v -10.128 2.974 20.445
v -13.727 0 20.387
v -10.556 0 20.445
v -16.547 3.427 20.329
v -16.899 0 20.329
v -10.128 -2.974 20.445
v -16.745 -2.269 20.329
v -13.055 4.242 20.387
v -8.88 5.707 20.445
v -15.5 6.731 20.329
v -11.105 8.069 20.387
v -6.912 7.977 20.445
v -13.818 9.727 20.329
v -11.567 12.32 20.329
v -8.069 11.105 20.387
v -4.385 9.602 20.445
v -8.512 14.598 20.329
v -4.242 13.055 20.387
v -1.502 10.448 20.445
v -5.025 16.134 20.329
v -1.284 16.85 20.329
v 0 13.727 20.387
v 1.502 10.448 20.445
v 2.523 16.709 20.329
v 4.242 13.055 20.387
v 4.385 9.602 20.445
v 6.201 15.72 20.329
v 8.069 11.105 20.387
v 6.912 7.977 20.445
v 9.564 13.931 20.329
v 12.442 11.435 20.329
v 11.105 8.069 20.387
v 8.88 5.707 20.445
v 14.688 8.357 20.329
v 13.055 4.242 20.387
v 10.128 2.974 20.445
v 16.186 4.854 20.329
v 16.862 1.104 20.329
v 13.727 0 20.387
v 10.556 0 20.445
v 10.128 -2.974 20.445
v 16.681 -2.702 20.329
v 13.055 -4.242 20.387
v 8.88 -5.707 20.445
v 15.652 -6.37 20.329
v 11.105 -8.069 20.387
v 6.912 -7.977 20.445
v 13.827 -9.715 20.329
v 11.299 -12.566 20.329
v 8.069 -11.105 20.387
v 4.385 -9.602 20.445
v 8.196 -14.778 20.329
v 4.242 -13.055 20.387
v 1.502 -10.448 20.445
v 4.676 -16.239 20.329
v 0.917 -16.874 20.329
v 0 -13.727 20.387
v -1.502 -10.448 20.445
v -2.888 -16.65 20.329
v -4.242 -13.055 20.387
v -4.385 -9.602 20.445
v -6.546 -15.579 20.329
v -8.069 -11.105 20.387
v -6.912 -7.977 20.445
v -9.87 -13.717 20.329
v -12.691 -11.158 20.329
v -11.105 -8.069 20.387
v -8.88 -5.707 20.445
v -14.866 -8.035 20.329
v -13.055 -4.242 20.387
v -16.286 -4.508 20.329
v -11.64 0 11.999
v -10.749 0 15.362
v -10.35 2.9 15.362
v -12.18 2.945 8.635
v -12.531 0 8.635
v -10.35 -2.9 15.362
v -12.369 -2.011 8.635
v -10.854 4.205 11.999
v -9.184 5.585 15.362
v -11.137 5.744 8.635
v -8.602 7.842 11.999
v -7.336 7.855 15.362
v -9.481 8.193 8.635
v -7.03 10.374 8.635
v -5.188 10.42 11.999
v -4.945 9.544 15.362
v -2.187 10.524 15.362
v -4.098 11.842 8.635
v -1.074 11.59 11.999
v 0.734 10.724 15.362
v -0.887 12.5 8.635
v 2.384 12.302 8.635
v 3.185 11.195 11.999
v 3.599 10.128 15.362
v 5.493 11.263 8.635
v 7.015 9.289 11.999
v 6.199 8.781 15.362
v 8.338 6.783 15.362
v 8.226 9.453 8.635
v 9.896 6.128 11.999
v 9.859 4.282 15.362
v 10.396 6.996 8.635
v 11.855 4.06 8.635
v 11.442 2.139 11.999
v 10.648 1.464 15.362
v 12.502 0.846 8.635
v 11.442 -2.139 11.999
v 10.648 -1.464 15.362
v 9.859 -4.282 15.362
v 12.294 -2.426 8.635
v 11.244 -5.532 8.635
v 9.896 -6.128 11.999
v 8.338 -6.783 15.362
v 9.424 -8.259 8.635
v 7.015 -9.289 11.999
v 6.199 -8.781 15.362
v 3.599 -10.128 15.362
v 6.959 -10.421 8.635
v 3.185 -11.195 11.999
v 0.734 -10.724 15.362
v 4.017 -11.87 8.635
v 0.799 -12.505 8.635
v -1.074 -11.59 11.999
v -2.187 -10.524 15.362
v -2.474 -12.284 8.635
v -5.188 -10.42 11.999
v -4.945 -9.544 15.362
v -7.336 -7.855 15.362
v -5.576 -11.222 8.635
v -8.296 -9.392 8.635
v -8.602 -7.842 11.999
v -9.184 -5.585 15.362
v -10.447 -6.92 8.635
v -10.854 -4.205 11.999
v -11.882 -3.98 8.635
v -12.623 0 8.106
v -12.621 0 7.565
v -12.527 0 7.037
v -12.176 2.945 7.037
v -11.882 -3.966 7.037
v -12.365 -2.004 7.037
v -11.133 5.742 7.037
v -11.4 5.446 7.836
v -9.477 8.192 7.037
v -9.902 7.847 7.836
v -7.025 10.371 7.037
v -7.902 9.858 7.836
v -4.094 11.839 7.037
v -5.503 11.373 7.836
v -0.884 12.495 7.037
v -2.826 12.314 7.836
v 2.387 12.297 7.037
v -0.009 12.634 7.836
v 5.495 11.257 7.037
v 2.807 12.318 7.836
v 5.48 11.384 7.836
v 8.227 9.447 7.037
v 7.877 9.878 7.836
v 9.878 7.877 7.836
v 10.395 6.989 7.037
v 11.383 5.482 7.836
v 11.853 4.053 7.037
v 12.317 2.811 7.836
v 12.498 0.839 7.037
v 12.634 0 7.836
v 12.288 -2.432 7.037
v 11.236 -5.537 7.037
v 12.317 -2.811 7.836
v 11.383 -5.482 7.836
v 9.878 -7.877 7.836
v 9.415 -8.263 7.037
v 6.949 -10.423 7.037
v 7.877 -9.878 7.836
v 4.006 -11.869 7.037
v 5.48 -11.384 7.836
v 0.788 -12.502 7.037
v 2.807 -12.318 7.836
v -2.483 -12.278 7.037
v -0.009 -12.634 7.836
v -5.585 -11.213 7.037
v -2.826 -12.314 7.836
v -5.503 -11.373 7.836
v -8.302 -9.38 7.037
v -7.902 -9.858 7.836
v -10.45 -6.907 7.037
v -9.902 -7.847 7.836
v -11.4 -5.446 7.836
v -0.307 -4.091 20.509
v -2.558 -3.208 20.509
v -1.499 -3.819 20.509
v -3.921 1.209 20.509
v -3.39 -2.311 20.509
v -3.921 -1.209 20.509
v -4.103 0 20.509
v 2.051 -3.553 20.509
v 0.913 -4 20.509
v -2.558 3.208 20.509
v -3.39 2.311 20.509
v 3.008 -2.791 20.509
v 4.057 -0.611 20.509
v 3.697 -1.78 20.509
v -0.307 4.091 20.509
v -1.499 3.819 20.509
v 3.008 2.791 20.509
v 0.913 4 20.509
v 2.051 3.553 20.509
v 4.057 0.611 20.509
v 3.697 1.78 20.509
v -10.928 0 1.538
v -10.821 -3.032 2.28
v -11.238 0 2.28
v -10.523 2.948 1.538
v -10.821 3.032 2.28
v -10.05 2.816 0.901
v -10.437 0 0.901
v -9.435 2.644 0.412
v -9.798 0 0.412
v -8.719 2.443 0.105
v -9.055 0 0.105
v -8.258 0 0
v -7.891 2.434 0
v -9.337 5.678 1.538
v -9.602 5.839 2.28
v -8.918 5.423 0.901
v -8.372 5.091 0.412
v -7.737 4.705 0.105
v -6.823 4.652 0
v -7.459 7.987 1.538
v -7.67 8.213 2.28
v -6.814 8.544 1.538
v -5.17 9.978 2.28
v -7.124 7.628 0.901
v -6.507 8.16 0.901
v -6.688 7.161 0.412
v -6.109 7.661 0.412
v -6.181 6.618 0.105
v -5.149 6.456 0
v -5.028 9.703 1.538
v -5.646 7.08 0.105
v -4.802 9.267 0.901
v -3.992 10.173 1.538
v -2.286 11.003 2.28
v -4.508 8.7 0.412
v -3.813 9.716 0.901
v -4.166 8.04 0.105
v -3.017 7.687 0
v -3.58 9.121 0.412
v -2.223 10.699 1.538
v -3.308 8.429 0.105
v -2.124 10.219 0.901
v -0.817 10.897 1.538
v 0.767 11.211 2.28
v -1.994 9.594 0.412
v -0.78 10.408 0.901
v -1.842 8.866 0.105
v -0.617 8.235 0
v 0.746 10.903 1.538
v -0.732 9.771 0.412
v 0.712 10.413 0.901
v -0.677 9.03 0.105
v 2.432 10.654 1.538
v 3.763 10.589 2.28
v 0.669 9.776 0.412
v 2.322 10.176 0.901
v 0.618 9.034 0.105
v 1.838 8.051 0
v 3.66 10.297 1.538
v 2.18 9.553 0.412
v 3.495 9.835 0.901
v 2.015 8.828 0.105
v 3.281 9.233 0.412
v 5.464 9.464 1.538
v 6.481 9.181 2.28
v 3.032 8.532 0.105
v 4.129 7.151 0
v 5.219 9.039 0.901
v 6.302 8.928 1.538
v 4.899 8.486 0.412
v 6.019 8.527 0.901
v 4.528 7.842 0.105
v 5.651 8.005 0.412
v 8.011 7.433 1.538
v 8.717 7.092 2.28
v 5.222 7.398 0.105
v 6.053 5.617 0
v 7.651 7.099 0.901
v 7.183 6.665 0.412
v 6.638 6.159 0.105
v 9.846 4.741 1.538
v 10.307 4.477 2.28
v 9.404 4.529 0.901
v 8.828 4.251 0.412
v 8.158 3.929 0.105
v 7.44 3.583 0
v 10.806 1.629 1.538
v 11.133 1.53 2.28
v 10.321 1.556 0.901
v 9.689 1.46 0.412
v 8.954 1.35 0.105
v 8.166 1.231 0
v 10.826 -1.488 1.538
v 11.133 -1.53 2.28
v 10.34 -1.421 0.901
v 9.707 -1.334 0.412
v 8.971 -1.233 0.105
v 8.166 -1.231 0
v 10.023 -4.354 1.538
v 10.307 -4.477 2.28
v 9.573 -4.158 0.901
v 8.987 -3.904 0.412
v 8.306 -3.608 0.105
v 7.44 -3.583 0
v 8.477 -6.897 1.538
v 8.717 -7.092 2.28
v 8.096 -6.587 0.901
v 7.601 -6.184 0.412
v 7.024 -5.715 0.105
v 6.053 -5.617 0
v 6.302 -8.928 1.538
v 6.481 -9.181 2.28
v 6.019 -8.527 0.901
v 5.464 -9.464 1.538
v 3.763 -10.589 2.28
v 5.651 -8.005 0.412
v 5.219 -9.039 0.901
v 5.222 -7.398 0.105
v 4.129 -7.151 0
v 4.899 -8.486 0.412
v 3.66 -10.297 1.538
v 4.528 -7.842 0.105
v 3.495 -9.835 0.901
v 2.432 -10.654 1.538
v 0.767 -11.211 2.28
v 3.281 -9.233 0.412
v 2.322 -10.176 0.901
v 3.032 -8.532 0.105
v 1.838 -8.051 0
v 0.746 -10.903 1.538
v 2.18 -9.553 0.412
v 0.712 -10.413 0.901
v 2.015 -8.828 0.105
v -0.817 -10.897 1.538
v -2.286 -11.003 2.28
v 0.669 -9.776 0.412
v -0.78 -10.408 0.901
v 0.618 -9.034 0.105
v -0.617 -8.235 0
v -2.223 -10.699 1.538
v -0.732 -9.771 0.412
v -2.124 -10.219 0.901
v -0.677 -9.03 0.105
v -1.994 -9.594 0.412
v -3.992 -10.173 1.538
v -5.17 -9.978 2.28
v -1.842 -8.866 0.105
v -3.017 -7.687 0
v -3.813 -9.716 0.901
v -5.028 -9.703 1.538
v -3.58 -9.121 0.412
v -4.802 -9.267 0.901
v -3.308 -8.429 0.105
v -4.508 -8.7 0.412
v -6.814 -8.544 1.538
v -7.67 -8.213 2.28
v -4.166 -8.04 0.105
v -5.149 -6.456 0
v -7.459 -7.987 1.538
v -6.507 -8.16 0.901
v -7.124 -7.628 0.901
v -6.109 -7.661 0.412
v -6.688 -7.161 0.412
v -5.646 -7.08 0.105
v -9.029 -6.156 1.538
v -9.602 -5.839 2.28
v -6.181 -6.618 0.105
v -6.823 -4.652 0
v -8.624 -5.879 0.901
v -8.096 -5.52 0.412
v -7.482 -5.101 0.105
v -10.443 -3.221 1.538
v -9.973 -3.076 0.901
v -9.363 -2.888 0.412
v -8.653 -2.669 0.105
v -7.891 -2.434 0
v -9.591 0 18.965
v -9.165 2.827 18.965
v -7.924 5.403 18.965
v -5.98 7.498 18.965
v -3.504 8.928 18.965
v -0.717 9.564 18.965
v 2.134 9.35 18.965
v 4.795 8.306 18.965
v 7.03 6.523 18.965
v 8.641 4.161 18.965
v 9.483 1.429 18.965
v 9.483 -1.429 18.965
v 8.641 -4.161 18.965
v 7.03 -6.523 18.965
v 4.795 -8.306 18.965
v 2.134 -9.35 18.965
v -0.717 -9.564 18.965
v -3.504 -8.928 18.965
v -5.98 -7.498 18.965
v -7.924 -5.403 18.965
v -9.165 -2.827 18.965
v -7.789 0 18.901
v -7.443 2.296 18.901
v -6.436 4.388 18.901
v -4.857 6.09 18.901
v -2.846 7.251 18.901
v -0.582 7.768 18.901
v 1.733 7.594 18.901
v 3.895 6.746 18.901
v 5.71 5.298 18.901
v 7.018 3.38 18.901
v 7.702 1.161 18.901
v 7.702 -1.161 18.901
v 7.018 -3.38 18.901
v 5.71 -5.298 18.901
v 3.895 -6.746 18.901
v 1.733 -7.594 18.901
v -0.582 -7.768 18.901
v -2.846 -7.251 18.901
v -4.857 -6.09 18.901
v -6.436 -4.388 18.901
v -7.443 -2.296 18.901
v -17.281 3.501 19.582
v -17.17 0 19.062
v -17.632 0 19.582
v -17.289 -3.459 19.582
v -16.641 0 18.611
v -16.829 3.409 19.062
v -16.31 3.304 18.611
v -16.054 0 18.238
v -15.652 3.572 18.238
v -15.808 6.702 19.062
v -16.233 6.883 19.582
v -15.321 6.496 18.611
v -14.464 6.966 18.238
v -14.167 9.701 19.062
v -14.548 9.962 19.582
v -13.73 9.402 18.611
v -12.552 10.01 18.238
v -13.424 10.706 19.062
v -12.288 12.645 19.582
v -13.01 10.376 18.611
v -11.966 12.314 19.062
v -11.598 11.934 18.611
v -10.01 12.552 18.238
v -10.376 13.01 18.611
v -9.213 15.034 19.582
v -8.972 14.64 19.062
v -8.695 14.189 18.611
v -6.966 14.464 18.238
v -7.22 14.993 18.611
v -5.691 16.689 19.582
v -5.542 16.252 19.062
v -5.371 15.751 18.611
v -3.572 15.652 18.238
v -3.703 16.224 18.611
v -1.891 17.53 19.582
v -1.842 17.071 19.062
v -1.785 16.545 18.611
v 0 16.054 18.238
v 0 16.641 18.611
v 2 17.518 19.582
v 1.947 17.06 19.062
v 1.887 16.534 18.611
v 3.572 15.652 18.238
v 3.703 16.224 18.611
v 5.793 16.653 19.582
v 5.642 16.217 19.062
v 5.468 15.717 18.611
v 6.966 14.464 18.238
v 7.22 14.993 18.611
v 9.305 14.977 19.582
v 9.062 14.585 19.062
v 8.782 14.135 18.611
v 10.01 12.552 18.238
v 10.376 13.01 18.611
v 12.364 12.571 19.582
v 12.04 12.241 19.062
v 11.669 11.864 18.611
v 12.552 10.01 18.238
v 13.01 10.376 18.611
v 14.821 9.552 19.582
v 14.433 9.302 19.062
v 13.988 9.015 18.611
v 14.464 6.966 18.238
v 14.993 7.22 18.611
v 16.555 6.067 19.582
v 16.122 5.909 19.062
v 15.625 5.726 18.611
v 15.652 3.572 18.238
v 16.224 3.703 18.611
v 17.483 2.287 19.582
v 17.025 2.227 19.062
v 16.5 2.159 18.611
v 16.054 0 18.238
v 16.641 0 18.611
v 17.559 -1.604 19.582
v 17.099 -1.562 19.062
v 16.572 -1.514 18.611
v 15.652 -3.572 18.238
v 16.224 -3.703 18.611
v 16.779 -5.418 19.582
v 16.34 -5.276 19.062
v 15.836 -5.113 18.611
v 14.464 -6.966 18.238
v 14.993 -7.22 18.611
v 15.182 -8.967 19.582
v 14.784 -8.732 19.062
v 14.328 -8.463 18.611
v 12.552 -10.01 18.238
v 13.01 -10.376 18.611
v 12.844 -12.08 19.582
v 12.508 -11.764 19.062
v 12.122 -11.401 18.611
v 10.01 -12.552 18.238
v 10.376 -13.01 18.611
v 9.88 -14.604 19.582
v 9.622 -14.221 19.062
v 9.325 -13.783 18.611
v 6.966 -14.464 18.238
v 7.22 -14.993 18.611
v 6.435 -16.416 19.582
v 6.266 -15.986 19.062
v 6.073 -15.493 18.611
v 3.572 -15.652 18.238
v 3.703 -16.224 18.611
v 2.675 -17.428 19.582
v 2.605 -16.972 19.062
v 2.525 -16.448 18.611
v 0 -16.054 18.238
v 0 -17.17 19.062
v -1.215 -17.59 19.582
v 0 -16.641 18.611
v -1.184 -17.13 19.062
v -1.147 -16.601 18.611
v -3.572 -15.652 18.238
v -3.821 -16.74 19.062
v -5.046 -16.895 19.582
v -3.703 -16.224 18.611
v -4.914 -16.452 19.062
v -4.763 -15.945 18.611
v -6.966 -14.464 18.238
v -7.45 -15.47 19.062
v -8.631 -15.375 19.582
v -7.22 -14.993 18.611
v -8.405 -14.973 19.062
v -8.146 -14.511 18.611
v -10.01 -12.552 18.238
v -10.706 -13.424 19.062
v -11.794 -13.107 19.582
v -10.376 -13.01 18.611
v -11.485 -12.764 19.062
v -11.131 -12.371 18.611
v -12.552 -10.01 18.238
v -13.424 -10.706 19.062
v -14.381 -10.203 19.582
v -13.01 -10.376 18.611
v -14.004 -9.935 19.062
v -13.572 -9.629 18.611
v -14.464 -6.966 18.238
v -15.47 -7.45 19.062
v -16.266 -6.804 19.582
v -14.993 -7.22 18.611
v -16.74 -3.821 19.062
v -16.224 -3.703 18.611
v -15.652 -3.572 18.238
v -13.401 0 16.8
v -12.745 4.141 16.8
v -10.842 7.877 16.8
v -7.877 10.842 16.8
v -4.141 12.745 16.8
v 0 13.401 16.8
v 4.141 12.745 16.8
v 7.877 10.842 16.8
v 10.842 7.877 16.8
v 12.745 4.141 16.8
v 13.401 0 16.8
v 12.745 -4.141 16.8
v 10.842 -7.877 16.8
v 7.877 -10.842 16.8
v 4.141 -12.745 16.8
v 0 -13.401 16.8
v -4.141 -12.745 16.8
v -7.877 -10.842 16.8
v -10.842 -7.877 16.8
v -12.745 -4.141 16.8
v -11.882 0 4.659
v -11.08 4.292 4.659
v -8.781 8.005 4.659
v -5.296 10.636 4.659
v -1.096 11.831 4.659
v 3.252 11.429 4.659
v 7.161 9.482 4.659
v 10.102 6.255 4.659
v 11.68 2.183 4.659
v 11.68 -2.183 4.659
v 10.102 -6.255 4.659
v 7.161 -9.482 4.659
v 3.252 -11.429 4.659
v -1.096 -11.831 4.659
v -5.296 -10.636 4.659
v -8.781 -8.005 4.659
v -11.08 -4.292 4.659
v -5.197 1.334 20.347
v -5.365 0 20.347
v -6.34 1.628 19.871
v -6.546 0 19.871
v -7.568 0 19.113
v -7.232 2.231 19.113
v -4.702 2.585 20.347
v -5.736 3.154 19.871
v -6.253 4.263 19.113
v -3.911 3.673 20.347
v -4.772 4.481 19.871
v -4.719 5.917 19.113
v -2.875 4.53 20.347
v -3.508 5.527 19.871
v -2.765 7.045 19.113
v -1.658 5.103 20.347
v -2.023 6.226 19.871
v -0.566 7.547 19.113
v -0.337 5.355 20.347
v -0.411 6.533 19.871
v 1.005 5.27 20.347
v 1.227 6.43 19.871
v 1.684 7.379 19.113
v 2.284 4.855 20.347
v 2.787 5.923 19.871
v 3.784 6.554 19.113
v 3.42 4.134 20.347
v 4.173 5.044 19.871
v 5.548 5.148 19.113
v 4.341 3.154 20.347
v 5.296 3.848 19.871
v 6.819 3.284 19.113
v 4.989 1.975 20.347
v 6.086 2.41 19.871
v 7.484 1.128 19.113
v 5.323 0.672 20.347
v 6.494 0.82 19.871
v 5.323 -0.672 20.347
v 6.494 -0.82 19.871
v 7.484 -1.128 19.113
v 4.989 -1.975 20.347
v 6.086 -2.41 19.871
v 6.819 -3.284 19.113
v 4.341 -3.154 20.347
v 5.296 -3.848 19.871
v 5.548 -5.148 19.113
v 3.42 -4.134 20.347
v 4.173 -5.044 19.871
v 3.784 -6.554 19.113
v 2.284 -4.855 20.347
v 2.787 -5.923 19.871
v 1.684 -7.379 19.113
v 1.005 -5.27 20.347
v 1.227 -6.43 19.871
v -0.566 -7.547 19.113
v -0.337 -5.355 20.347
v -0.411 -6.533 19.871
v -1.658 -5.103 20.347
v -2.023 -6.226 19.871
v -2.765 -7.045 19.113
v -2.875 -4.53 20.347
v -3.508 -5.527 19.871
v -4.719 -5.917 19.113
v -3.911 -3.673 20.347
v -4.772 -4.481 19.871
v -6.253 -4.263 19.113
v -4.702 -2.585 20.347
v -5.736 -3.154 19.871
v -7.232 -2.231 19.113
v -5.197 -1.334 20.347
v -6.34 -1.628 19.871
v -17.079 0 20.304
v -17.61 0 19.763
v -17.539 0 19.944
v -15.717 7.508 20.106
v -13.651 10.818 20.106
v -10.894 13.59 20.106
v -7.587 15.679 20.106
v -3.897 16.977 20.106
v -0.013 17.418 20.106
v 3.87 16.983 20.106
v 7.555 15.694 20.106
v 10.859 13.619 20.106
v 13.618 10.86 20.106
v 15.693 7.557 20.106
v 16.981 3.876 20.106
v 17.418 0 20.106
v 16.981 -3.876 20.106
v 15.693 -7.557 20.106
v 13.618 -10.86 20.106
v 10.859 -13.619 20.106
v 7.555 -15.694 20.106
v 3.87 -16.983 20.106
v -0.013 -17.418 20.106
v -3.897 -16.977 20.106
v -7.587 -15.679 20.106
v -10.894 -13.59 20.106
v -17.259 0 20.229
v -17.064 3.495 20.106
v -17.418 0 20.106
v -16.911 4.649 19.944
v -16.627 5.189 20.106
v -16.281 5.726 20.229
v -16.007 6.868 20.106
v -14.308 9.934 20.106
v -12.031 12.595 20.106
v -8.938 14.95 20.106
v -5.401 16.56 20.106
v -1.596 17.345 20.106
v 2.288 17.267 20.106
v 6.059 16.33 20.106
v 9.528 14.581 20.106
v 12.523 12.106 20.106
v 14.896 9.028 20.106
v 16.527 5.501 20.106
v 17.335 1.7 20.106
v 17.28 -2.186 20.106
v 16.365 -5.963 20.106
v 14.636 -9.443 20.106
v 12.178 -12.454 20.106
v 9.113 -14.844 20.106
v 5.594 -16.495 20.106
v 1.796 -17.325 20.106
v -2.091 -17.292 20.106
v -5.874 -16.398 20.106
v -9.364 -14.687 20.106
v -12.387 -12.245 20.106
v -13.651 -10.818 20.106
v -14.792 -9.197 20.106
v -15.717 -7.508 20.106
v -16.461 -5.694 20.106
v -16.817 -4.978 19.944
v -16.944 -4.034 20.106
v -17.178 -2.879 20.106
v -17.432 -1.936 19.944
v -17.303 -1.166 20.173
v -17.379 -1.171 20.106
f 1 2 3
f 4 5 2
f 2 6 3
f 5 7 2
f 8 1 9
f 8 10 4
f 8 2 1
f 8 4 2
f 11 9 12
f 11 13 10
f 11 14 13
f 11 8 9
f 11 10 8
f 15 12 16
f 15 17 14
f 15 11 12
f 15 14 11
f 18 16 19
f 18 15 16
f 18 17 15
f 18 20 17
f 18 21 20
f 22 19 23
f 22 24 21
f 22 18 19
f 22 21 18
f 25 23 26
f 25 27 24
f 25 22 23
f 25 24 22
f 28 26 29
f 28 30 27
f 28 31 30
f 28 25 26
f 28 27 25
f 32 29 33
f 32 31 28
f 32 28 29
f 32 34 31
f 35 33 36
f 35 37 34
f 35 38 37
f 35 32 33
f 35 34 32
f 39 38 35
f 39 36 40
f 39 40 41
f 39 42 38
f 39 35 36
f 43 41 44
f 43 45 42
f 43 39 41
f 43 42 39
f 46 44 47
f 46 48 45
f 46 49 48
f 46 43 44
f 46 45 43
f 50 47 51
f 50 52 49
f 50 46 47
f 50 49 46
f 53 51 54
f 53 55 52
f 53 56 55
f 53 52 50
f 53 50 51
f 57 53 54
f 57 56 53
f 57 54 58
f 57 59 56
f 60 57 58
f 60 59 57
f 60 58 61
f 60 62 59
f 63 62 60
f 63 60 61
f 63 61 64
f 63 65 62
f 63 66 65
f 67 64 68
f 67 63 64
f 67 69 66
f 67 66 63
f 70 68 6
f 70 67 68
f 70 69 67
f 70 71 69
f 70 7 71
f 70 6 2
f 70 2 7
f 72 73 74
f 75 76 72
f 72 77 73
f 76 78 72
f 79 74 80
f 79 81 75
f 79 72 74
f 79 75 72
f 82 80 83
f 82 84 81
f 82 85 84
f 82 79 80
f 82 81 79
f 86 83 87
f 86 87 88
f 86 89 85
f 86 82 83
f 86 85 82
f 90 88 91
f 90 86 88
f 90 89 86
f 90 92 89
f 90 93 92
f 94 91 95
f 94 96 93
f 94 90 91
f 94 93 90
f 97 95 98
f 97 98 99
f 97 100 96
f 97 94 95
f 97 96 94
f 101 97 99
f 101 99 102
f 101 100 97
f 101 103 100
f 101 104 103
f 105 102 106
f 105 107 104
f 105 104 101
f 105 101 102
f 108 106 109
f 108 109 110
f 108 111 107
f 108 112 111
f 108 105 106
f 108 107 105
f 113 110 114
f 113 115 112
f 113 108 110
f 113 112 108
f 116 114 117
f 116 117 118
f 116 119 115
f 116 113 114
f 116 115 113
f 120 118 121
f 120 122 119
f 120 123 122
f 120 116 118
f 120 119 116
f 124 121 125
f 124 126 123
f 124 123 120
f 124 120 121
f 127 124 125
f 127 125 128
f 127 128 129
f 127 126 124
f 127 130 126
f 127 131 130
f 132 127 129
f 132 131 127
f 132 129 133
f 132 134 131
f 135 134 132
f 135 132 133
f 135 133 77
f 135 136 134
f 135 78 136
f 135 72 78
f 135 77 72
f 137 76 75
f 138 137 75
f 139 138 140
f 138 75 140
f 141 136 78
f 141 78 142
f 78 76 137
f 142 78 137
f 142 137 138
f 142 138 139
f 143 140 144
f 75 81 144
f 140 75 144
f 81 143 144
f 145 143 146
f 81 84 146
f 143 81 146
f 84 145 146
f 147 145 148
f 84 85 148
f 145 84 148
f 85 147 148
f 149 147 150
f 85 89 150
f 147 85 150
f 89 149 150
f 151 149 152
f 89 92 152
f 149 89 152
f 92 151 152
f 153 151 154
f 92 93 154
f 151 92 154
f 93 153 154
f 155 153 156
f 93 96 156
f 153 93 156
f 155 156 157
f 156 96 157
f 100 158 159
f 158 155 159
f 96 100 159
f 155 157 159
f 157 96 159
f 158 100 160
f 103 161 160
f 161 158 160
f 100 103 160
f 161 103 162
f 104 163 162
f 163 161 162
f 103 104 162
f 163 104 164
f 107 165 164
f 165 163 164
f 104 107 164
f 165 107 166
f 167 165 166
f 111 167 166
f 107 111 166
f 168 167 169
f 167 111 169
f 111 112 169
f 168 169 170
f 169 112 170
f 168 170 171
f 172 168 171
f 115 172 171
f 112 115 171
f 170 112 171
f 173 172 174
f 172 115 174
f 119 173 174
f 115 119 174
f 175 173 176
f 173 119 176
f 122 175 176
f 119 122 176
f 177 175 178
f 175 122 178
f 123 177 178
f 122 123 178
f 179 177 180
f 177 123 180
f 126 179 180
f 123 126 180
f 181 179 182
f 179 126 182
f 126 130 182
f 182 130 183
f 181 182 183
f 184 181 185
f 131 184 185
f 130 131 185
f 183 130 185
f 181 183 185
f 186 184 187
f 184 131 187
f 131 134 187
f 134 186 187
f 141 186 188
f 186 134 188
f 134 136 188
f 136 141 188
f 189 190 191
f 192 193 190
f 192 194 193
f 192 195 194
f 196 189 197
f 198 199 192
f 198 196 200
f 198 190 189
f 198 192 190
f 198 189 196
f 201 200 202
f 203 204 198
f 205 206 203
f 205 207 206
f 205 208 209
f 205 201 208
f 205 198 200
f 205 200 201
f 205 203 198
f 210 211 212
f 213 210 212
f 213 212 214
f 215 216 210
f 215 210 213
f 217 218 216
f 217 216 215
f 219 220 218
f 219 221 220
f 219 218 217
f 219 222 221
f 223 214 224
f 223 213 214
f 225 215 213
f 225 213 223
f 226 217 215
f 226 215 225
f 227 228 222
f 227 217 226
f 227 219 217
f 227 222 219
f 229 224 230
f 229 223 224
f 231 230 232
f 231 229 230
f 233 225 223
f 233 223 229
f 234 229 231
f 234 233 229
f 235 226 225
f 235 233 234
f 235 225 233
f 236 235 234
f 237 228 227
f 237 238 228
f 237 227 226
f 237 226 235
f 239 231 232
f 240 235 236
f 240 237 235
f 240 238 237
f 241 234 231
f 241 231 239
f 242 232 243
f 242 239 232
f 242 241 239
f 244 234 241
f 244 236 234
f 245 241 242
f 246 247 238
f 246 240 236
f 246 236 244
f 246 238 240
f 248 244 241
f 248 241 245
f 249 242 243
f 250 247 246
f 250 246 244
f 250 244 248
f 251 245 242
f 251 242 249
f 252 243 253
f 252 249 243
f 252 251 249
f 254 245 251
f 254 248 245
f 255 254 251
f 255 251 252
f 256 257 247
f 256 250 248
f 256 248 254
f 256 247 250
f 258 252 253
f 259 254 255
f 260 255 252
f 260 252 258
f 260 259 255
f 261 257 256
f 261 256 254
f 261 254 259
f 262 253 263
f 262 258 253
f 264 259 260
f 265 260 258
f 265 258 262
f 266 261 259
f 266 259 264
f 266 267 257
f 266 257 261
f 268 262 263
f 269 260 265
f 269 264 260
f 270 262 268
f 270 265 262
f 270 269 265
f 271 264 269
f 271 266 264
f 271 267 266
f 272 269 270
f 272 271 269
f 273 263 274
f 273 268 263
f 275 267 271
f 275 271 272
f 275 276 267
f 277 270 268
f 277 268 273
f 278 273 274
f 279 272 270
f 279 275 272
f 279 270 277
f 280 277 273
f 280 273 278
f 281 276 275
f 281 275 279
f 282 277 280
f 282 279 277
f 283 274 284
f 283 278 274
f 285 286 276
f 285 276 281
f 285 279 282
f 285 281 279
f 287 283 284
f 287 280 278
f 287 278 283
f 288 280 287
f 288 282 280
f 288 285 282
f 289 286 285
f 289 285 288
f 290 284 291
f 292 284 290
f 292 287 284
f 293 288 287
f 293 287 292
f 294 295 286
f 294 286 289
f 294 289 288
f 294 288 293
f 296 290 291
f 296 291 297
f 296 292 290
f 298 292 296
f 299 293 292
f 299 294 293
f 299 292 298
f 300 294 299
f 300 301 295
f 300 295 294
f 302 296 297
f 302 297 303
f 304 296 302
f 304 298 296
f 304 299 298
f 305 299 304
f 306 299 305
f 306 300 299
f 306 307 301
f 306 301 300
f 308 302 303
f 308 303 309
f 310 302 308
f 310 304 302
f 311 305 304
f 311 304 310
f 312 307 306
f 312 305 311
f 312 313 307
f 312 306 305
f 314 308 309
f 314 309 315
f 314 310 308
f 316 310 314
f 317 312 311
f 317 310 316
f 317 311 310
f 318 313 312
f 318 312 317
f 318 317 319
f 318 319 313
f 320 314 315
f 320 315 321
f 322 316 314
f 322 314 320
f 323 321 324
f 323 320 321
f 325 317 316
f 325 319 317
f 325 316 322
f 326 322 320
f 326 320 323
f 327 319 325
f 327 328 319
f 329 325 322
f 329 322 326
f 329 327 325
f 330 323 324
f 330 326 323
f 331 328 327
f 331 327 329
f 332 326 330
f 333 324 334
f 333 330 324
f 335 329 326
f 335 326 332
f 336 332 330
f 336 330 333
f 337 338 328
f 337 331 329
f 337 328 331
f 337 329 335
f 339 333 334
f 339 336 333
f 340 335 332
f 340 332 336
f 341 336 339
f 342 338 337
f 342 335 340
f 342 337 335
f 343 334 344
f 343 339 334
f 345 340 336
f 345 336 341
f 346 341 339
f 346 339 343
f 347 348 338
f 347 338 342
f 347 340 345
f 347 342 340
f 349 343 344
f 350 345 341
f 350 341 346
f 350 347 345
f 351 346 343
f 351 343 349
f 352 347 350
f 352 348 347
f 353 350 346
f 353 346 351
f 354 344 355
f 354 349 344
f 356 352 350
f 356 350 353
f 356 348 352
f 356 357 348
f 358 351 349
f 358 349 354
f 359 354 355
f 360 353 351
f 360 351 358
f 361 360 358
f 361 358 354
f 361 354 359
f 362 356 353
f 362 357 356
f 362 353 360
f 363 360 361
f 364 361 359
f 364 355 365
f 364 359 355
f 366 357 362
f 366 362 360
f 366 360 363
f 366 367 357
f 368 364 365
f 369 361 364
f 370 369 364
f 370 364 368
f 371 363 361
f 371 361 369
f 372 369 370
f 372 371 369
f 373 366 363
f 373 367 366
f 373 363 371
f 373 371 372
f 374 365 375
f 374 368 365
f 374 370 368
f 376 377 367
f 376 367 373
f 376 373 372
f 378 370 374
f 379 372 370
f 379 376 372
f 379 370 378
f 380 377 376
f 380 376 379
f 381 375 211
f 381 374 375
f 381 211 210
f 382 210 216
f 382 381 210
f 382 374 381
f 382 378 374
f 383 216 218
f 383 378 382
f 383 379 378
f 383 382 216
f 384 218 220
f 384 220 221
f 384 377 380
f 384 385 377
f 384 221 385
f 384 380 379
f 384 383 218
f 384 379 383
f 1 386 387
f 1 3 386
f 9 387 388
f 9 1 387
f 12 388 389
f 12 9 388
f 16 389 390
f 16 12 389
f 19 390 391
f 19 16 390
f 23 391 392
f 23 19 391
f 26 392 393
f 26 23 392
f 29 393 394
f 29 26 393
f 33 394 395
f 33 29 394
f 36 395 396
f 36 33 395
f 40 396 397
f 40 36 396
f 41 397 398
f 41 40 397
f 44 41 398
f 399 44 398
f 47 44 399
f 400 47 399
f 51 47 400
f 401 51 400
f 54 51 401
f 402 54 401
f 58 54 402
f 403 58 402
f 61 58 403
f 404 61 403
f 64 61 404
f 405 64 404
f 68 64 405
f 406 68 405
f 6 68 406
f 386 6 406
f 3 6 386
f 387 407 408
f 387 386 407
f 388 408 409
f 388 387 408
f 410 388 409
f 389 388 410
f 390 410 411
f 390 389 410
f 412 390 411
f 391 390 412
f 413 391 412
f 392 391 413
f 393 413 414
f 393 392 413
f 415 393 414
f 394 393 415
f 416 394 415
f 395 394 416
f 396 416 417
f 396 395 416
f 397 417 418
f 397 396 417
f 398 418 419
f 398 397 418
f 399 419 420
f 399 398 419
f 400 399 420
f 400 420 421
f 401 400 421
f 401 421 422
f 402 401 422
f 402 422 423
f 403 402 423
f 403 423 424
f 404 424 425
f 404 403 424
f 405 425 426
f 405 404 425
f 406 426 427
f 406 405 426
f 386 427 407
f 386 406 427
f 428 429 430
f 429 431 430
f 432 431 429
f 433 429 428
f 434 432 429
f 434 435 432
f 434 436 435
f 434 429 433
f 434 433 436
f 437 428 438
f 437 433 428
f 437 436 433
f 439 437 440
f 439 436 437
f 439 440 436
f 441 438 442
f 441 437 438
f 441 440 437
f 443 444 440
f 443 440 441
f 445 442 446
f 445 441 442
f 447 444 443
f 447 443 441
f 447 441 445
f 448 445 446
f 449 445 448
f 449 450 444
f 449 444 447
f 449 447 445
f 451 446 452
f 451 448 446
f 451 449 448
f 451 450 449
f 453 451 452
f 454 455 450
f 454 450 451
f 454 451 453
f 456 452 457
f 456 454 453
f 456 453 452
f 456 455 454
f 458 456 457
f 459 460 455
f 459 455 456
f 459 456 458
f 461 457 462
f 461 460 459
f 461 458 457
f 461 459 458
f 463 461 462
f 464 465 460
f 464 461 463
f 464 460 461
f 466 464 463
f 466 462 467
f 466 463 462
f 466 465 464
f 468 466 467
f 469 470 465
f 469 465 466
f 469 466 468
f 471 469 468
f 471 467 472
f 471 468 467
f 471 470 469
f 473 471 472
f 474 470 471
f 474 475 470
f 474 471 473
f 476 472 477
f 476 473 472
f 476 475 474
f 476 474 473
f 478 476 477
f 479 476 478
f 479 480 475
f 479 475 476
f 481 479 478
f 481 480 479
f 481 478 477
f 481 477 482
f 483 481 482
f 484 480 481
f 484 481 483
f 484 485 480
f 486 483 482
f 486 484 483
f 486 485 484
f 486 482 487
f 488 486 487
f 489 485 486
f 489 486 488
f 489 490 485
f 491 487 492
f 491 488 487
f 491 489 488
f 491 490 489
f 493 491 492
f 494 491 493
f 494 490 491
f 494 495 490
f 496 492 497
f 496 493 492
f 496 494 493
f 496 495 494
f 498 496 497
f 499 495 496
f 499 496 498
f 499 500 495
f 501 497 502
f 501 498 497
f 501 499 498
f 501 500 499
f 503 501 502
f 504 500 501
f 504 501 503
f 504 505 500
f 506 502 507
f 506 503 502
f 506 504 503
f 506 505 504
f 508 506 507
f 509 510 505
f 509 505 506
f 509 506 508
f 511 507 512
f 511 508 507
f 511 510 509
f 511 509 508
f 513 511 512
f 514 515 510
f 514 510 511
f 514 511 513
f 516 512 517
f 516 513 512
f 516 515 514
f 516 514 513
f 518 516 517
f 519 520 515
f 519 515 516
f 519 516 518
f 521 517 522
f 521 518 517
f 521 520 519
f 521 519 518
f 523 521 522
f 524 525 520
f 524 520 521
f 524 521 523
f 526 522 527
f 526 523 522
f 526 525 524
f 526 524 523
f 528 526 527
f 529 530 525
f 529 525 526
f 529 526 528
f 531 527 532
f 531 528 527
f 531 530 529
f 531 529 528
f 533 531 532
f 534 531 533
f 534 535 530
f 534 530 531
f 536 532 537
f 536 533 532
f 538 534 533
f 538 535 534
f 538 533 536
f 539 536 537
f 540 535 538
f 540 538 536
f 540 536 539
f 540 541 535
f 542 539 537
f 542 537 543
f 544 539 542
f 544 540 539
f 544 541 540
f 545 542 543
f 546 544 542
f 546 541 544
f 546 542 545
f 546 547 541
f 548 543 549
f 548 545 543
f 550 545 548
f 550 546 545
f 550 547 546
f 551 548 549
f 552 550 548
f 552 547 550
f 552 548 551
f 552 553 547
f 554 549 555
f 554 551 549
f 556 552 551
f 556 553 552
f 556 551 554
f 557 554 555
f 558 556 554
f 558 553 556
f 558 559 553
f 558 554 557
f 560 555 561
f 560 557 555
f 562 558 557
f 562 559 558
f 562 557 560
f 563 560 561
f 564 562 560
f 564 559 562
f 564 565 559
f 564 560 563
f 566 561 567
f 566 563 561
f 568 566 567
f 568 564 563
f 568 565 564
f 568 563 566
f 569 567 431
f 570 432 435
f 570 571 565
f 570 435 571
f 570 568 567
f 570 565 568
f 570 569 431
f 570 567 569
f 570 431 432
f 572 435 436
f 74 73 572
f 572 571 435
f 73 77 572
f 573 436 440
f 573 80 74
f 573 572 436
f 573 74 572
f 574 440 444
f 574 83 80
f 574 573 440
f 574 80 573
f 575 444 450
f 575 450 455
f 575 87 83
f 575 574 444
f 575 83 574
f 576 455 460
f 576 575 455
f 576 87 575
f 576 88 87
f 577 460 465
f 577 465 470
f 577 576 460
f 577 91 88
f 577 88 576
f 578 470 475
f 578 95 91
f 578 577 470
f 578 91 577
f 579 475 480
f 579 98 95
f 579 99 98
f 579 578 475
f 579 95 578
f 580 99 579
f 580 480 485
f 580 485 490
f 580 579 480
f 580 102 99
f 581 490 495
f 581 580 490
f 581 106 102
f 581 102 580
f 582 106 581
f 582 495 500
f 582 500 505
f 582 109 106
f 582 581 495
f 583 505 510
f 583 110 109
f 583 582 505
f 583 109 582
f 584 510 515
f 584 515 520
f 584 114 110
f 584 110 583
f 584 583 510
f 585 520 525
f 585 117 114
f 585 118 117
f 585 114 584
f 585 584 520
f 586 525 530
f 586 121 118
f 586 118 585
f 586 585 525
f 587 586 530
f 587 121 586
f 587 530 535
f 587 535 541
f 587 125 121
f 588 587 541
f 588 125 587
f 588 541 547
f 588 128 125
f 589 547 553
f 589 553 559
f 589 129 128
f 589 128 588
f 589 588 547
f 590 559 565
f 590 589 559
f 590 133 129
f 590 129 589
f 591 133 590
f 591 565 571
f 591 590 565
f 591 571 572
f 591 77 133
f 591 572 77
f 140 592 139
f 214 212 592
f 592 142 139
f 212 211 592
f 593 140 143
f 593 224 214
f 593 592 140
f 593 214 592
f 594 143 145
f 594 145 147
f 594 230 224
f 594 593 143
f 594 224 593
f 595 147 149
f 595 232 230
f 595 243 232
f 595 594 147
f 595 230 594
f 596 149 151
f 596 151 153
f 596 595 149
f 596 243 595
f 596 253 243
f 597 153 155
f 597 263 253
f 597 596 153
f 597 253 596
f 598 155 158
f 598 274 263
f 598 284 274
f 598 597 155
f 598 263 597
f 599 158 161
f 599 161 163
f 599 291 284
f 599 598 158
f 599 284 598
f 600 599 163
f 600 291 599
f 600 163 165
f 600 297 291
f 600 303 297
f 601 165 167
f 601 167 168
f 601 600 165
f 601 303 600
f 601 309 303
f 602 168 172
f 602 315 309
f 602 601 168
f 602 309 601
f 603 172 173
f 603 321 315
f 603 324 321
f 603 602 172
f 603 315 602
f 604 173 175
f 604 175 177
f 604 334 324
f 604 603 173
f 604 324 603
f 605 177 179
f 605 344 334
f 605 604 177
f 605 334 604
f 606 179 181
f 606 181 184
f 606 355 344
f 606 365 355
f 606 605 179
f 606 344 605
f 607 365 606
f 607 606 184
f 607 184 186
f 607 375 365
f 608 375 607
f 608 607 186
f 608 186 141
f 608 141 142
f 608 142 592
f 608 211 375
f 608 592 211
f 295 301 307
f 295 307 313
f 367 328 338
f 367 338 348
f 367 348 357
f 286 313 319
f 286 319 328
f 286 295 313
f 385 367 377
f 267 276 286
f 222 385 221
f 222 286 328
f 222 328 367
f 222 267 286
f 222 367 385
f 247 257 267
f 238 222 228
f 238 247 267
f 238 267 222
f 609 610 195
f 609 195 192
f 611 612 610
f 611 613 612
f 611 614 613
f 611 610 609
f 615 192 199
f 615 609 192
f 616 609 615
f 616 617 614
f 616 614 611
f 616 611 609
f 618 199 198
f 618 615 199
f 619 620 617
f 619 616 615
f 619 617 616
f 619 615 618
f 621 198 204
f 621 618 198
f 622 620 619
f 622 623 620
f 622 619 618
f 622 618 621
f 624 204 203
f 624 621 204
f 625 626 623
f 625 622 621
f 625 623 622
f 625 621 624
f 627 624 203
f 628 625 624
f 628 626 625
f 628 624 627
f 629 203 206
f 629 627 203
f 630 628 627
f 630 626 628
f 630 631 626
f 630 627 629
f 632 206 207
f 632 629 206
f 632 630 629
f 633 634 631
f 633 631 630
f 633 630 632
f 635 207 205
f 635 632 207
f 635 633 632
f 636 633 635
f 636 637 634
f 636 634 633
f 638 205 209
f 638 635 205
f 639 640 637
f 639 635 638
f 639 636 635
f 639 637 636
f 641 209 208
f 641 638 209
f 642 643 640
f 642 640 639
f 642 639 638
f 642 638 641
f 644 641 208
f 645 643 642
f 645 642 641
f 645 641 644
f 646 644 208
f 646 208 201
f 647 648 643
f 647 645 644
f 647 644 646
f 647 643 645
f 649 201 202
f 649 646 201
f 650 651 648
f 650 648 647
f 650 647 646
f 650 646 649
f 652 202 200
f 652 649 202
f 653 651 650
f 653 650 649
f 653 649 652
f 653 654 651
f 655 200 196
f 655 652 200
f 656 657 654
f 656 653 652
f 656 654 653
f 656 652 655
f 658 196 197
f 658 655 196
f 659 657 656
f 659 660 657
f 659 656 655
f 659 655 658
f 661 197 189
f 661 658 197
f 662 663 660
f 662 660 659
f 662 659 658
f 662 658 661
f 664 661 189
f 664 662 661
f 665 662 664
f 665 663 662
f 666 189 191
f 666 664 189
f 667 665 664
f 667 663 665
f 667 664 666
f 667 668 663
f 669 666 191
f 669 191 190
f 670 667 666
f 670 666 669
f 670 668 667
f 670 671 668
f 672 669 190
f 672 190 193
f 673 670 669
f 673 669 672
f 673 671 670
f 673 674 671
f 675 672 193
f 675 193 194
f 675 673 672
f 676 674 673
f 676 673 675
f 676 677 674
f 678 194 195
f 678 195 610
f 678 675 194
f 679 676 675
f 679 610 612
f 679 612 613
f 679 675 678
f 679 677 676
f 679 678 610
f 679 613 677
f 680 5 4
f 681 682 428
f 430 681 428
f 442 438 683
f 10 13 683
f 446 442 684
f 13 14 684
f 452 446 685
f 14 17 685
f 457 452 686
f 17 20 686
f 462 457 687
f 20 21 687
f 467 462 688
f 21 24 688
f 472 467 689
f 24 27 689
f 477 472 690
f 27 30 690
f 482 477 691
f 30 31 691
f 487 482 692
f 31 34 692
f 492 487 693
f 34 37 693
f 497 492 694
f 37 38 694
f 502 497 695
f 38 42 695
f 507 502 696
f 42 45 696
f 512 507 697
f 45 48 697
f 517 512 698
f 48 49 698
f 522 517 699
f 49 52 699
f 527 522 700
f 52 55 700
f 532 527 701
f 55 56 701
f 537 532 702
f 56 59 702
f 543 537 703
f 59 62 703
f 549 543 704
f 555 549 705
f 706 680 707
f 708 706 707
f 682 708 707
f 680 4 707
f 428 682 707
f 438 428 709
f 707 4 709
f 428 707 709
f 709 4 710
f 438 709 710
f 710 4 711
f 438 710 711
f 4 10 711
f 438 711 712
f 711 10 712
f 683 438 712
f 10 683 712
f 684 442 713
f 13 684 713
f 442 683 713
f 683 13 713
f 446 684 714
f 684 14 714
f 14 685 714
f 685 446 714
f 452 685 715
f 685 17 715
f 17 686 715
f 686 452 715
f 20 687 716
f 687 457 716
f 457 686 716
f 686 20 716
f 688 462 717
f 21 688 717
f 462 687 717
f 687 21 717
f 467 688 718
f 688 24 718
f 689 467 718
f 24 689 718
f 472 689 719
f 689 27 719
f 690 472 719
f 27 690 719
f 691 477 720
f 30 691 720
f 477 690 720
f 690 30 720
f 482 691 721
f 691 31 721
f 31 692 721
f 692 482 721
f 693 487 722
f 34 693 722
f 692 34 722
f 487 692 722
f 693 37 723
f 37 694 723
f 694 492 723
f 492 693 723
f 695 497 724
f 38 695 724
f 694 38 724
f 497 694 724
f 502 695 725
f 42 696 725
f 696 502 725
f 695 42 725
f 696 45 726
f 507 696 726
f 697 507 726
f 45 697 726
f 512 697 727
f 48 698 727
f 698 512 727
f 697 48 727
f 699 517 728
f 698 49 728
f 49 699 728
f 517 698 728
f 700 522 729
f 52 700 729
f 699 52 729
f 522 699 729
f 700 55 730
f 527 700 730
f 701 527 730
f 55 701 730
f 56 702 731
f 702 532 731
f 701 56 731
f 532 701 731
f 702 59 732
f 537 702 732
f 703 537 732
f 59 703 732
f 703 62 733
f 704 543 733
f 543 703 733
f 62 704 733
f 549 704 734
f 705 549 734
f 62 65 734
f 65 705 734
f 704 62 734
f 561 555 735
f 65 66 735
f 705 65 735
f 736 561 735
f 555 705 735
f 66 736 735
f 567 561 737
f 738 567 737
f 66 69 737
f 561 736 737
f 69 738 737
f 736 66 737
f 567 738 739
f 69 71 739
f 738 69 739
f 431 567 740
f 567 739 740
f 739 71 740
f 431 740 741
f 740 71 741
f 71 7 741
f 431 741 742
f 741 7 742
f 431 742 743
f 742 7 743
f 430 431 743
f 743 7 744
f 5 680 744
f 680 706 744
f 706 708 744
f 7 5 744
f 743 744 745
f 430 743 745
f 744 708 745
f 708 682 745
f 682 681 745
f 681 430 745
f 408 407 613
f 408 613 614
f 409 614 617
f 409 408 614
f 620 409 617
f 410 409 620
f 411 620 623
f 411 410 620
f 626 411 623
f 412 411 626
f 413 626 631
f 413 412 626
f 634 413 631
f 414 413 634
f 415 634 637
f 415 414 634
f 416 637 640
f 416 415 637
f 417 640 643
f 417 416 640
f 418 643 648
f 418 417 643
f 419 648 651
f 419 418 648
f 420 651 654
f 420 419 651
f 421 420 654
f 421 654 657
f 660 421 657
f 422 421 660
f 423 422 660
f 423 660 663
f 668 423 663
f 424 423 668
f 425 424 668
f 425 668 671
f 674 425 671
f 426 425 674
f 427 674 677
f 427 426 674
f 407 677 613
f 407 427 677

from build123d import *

# Parameters (mm, degrees)
F2_R = 5
F3_R = 0.7471384798
F5_R = 3.0872818621


# Not quite as in the source:
# - a fillet or chamfer that OpenCascade refuses, or shapes differently, is made with other operations: its cross-section is extruded or revolved along the edge and cut away or added


with BuildPart() as f1:
    # F0 (on Front) → F1 (revolve)
    with BuildSketch(Plane.XZ):
        Polygon((-10.6199271977, 0), (0, 0), (0, 20.5089394003), (-6.1166980304, 20.5089394003), (-7.7893259004, 18.9006421715), (-9.590617381, 18.9649742097), (-10.5555951595, 20.4446054995), (-17.6320988685, 20.3159432858), (-17.6320988685, 19.0936364233), (-10.748591274, 15.3623912483), (-12.7428779379, 7.8355651349), align=None)
    revolve(axis=Axis((0, 0, 10.2544697002), (0, 0, -1)))

    # F2
    f2_edges = [f1.edges().sort_by_distance(p)[0] for p in [
        (6.116698, 0, 20.508939),
    ]]
    fillet(f2_edges, radius=F2_R)

    # F3
    f3_edges = [f1.edges().sort_by_distance(p)[0] for p in [
        (17.632099, 0, 20.315943),
    ]]
    fillet(f3_edges, radius=F3_R)

    # F4: fillet of radius 5 on 1 edges, made by hand

    # F4_s1 → F4_t2 (revolve, cut)
    with BuildSketch(Plane.XZ):
        with BuildLine():
            ThreePointArc((-17.6320943676, 19.5822655038), (-16.9135613616, 18.827647757), (-16.0542267415, 18.2383416946))
            Line((-16.0542267415, 18.2383416946), (-17.6320988685, 19.0936364233))
            ThreePointArc((-17.6320988685, 19.0936364233), (-17.6320988685, 19.3379509636), (-17.6320943676, 19.5822655038))
        make_face()
    revolve(axis=Axis((0, 0, 19.0936364233), (0, 0, -1)), mode=Mode.SUBTRACT)

    # F5
    f5_edges = [f1.edges().sort_by_distance(p)[0] for p in [
        (12.742878, 0, 7.835565),
        (10.619927, 0, 0),
        (-11.681403, 0, 3.917783),
    ]]
    fillet(f5_edges, radius=F5_R)


solid = f1.part
